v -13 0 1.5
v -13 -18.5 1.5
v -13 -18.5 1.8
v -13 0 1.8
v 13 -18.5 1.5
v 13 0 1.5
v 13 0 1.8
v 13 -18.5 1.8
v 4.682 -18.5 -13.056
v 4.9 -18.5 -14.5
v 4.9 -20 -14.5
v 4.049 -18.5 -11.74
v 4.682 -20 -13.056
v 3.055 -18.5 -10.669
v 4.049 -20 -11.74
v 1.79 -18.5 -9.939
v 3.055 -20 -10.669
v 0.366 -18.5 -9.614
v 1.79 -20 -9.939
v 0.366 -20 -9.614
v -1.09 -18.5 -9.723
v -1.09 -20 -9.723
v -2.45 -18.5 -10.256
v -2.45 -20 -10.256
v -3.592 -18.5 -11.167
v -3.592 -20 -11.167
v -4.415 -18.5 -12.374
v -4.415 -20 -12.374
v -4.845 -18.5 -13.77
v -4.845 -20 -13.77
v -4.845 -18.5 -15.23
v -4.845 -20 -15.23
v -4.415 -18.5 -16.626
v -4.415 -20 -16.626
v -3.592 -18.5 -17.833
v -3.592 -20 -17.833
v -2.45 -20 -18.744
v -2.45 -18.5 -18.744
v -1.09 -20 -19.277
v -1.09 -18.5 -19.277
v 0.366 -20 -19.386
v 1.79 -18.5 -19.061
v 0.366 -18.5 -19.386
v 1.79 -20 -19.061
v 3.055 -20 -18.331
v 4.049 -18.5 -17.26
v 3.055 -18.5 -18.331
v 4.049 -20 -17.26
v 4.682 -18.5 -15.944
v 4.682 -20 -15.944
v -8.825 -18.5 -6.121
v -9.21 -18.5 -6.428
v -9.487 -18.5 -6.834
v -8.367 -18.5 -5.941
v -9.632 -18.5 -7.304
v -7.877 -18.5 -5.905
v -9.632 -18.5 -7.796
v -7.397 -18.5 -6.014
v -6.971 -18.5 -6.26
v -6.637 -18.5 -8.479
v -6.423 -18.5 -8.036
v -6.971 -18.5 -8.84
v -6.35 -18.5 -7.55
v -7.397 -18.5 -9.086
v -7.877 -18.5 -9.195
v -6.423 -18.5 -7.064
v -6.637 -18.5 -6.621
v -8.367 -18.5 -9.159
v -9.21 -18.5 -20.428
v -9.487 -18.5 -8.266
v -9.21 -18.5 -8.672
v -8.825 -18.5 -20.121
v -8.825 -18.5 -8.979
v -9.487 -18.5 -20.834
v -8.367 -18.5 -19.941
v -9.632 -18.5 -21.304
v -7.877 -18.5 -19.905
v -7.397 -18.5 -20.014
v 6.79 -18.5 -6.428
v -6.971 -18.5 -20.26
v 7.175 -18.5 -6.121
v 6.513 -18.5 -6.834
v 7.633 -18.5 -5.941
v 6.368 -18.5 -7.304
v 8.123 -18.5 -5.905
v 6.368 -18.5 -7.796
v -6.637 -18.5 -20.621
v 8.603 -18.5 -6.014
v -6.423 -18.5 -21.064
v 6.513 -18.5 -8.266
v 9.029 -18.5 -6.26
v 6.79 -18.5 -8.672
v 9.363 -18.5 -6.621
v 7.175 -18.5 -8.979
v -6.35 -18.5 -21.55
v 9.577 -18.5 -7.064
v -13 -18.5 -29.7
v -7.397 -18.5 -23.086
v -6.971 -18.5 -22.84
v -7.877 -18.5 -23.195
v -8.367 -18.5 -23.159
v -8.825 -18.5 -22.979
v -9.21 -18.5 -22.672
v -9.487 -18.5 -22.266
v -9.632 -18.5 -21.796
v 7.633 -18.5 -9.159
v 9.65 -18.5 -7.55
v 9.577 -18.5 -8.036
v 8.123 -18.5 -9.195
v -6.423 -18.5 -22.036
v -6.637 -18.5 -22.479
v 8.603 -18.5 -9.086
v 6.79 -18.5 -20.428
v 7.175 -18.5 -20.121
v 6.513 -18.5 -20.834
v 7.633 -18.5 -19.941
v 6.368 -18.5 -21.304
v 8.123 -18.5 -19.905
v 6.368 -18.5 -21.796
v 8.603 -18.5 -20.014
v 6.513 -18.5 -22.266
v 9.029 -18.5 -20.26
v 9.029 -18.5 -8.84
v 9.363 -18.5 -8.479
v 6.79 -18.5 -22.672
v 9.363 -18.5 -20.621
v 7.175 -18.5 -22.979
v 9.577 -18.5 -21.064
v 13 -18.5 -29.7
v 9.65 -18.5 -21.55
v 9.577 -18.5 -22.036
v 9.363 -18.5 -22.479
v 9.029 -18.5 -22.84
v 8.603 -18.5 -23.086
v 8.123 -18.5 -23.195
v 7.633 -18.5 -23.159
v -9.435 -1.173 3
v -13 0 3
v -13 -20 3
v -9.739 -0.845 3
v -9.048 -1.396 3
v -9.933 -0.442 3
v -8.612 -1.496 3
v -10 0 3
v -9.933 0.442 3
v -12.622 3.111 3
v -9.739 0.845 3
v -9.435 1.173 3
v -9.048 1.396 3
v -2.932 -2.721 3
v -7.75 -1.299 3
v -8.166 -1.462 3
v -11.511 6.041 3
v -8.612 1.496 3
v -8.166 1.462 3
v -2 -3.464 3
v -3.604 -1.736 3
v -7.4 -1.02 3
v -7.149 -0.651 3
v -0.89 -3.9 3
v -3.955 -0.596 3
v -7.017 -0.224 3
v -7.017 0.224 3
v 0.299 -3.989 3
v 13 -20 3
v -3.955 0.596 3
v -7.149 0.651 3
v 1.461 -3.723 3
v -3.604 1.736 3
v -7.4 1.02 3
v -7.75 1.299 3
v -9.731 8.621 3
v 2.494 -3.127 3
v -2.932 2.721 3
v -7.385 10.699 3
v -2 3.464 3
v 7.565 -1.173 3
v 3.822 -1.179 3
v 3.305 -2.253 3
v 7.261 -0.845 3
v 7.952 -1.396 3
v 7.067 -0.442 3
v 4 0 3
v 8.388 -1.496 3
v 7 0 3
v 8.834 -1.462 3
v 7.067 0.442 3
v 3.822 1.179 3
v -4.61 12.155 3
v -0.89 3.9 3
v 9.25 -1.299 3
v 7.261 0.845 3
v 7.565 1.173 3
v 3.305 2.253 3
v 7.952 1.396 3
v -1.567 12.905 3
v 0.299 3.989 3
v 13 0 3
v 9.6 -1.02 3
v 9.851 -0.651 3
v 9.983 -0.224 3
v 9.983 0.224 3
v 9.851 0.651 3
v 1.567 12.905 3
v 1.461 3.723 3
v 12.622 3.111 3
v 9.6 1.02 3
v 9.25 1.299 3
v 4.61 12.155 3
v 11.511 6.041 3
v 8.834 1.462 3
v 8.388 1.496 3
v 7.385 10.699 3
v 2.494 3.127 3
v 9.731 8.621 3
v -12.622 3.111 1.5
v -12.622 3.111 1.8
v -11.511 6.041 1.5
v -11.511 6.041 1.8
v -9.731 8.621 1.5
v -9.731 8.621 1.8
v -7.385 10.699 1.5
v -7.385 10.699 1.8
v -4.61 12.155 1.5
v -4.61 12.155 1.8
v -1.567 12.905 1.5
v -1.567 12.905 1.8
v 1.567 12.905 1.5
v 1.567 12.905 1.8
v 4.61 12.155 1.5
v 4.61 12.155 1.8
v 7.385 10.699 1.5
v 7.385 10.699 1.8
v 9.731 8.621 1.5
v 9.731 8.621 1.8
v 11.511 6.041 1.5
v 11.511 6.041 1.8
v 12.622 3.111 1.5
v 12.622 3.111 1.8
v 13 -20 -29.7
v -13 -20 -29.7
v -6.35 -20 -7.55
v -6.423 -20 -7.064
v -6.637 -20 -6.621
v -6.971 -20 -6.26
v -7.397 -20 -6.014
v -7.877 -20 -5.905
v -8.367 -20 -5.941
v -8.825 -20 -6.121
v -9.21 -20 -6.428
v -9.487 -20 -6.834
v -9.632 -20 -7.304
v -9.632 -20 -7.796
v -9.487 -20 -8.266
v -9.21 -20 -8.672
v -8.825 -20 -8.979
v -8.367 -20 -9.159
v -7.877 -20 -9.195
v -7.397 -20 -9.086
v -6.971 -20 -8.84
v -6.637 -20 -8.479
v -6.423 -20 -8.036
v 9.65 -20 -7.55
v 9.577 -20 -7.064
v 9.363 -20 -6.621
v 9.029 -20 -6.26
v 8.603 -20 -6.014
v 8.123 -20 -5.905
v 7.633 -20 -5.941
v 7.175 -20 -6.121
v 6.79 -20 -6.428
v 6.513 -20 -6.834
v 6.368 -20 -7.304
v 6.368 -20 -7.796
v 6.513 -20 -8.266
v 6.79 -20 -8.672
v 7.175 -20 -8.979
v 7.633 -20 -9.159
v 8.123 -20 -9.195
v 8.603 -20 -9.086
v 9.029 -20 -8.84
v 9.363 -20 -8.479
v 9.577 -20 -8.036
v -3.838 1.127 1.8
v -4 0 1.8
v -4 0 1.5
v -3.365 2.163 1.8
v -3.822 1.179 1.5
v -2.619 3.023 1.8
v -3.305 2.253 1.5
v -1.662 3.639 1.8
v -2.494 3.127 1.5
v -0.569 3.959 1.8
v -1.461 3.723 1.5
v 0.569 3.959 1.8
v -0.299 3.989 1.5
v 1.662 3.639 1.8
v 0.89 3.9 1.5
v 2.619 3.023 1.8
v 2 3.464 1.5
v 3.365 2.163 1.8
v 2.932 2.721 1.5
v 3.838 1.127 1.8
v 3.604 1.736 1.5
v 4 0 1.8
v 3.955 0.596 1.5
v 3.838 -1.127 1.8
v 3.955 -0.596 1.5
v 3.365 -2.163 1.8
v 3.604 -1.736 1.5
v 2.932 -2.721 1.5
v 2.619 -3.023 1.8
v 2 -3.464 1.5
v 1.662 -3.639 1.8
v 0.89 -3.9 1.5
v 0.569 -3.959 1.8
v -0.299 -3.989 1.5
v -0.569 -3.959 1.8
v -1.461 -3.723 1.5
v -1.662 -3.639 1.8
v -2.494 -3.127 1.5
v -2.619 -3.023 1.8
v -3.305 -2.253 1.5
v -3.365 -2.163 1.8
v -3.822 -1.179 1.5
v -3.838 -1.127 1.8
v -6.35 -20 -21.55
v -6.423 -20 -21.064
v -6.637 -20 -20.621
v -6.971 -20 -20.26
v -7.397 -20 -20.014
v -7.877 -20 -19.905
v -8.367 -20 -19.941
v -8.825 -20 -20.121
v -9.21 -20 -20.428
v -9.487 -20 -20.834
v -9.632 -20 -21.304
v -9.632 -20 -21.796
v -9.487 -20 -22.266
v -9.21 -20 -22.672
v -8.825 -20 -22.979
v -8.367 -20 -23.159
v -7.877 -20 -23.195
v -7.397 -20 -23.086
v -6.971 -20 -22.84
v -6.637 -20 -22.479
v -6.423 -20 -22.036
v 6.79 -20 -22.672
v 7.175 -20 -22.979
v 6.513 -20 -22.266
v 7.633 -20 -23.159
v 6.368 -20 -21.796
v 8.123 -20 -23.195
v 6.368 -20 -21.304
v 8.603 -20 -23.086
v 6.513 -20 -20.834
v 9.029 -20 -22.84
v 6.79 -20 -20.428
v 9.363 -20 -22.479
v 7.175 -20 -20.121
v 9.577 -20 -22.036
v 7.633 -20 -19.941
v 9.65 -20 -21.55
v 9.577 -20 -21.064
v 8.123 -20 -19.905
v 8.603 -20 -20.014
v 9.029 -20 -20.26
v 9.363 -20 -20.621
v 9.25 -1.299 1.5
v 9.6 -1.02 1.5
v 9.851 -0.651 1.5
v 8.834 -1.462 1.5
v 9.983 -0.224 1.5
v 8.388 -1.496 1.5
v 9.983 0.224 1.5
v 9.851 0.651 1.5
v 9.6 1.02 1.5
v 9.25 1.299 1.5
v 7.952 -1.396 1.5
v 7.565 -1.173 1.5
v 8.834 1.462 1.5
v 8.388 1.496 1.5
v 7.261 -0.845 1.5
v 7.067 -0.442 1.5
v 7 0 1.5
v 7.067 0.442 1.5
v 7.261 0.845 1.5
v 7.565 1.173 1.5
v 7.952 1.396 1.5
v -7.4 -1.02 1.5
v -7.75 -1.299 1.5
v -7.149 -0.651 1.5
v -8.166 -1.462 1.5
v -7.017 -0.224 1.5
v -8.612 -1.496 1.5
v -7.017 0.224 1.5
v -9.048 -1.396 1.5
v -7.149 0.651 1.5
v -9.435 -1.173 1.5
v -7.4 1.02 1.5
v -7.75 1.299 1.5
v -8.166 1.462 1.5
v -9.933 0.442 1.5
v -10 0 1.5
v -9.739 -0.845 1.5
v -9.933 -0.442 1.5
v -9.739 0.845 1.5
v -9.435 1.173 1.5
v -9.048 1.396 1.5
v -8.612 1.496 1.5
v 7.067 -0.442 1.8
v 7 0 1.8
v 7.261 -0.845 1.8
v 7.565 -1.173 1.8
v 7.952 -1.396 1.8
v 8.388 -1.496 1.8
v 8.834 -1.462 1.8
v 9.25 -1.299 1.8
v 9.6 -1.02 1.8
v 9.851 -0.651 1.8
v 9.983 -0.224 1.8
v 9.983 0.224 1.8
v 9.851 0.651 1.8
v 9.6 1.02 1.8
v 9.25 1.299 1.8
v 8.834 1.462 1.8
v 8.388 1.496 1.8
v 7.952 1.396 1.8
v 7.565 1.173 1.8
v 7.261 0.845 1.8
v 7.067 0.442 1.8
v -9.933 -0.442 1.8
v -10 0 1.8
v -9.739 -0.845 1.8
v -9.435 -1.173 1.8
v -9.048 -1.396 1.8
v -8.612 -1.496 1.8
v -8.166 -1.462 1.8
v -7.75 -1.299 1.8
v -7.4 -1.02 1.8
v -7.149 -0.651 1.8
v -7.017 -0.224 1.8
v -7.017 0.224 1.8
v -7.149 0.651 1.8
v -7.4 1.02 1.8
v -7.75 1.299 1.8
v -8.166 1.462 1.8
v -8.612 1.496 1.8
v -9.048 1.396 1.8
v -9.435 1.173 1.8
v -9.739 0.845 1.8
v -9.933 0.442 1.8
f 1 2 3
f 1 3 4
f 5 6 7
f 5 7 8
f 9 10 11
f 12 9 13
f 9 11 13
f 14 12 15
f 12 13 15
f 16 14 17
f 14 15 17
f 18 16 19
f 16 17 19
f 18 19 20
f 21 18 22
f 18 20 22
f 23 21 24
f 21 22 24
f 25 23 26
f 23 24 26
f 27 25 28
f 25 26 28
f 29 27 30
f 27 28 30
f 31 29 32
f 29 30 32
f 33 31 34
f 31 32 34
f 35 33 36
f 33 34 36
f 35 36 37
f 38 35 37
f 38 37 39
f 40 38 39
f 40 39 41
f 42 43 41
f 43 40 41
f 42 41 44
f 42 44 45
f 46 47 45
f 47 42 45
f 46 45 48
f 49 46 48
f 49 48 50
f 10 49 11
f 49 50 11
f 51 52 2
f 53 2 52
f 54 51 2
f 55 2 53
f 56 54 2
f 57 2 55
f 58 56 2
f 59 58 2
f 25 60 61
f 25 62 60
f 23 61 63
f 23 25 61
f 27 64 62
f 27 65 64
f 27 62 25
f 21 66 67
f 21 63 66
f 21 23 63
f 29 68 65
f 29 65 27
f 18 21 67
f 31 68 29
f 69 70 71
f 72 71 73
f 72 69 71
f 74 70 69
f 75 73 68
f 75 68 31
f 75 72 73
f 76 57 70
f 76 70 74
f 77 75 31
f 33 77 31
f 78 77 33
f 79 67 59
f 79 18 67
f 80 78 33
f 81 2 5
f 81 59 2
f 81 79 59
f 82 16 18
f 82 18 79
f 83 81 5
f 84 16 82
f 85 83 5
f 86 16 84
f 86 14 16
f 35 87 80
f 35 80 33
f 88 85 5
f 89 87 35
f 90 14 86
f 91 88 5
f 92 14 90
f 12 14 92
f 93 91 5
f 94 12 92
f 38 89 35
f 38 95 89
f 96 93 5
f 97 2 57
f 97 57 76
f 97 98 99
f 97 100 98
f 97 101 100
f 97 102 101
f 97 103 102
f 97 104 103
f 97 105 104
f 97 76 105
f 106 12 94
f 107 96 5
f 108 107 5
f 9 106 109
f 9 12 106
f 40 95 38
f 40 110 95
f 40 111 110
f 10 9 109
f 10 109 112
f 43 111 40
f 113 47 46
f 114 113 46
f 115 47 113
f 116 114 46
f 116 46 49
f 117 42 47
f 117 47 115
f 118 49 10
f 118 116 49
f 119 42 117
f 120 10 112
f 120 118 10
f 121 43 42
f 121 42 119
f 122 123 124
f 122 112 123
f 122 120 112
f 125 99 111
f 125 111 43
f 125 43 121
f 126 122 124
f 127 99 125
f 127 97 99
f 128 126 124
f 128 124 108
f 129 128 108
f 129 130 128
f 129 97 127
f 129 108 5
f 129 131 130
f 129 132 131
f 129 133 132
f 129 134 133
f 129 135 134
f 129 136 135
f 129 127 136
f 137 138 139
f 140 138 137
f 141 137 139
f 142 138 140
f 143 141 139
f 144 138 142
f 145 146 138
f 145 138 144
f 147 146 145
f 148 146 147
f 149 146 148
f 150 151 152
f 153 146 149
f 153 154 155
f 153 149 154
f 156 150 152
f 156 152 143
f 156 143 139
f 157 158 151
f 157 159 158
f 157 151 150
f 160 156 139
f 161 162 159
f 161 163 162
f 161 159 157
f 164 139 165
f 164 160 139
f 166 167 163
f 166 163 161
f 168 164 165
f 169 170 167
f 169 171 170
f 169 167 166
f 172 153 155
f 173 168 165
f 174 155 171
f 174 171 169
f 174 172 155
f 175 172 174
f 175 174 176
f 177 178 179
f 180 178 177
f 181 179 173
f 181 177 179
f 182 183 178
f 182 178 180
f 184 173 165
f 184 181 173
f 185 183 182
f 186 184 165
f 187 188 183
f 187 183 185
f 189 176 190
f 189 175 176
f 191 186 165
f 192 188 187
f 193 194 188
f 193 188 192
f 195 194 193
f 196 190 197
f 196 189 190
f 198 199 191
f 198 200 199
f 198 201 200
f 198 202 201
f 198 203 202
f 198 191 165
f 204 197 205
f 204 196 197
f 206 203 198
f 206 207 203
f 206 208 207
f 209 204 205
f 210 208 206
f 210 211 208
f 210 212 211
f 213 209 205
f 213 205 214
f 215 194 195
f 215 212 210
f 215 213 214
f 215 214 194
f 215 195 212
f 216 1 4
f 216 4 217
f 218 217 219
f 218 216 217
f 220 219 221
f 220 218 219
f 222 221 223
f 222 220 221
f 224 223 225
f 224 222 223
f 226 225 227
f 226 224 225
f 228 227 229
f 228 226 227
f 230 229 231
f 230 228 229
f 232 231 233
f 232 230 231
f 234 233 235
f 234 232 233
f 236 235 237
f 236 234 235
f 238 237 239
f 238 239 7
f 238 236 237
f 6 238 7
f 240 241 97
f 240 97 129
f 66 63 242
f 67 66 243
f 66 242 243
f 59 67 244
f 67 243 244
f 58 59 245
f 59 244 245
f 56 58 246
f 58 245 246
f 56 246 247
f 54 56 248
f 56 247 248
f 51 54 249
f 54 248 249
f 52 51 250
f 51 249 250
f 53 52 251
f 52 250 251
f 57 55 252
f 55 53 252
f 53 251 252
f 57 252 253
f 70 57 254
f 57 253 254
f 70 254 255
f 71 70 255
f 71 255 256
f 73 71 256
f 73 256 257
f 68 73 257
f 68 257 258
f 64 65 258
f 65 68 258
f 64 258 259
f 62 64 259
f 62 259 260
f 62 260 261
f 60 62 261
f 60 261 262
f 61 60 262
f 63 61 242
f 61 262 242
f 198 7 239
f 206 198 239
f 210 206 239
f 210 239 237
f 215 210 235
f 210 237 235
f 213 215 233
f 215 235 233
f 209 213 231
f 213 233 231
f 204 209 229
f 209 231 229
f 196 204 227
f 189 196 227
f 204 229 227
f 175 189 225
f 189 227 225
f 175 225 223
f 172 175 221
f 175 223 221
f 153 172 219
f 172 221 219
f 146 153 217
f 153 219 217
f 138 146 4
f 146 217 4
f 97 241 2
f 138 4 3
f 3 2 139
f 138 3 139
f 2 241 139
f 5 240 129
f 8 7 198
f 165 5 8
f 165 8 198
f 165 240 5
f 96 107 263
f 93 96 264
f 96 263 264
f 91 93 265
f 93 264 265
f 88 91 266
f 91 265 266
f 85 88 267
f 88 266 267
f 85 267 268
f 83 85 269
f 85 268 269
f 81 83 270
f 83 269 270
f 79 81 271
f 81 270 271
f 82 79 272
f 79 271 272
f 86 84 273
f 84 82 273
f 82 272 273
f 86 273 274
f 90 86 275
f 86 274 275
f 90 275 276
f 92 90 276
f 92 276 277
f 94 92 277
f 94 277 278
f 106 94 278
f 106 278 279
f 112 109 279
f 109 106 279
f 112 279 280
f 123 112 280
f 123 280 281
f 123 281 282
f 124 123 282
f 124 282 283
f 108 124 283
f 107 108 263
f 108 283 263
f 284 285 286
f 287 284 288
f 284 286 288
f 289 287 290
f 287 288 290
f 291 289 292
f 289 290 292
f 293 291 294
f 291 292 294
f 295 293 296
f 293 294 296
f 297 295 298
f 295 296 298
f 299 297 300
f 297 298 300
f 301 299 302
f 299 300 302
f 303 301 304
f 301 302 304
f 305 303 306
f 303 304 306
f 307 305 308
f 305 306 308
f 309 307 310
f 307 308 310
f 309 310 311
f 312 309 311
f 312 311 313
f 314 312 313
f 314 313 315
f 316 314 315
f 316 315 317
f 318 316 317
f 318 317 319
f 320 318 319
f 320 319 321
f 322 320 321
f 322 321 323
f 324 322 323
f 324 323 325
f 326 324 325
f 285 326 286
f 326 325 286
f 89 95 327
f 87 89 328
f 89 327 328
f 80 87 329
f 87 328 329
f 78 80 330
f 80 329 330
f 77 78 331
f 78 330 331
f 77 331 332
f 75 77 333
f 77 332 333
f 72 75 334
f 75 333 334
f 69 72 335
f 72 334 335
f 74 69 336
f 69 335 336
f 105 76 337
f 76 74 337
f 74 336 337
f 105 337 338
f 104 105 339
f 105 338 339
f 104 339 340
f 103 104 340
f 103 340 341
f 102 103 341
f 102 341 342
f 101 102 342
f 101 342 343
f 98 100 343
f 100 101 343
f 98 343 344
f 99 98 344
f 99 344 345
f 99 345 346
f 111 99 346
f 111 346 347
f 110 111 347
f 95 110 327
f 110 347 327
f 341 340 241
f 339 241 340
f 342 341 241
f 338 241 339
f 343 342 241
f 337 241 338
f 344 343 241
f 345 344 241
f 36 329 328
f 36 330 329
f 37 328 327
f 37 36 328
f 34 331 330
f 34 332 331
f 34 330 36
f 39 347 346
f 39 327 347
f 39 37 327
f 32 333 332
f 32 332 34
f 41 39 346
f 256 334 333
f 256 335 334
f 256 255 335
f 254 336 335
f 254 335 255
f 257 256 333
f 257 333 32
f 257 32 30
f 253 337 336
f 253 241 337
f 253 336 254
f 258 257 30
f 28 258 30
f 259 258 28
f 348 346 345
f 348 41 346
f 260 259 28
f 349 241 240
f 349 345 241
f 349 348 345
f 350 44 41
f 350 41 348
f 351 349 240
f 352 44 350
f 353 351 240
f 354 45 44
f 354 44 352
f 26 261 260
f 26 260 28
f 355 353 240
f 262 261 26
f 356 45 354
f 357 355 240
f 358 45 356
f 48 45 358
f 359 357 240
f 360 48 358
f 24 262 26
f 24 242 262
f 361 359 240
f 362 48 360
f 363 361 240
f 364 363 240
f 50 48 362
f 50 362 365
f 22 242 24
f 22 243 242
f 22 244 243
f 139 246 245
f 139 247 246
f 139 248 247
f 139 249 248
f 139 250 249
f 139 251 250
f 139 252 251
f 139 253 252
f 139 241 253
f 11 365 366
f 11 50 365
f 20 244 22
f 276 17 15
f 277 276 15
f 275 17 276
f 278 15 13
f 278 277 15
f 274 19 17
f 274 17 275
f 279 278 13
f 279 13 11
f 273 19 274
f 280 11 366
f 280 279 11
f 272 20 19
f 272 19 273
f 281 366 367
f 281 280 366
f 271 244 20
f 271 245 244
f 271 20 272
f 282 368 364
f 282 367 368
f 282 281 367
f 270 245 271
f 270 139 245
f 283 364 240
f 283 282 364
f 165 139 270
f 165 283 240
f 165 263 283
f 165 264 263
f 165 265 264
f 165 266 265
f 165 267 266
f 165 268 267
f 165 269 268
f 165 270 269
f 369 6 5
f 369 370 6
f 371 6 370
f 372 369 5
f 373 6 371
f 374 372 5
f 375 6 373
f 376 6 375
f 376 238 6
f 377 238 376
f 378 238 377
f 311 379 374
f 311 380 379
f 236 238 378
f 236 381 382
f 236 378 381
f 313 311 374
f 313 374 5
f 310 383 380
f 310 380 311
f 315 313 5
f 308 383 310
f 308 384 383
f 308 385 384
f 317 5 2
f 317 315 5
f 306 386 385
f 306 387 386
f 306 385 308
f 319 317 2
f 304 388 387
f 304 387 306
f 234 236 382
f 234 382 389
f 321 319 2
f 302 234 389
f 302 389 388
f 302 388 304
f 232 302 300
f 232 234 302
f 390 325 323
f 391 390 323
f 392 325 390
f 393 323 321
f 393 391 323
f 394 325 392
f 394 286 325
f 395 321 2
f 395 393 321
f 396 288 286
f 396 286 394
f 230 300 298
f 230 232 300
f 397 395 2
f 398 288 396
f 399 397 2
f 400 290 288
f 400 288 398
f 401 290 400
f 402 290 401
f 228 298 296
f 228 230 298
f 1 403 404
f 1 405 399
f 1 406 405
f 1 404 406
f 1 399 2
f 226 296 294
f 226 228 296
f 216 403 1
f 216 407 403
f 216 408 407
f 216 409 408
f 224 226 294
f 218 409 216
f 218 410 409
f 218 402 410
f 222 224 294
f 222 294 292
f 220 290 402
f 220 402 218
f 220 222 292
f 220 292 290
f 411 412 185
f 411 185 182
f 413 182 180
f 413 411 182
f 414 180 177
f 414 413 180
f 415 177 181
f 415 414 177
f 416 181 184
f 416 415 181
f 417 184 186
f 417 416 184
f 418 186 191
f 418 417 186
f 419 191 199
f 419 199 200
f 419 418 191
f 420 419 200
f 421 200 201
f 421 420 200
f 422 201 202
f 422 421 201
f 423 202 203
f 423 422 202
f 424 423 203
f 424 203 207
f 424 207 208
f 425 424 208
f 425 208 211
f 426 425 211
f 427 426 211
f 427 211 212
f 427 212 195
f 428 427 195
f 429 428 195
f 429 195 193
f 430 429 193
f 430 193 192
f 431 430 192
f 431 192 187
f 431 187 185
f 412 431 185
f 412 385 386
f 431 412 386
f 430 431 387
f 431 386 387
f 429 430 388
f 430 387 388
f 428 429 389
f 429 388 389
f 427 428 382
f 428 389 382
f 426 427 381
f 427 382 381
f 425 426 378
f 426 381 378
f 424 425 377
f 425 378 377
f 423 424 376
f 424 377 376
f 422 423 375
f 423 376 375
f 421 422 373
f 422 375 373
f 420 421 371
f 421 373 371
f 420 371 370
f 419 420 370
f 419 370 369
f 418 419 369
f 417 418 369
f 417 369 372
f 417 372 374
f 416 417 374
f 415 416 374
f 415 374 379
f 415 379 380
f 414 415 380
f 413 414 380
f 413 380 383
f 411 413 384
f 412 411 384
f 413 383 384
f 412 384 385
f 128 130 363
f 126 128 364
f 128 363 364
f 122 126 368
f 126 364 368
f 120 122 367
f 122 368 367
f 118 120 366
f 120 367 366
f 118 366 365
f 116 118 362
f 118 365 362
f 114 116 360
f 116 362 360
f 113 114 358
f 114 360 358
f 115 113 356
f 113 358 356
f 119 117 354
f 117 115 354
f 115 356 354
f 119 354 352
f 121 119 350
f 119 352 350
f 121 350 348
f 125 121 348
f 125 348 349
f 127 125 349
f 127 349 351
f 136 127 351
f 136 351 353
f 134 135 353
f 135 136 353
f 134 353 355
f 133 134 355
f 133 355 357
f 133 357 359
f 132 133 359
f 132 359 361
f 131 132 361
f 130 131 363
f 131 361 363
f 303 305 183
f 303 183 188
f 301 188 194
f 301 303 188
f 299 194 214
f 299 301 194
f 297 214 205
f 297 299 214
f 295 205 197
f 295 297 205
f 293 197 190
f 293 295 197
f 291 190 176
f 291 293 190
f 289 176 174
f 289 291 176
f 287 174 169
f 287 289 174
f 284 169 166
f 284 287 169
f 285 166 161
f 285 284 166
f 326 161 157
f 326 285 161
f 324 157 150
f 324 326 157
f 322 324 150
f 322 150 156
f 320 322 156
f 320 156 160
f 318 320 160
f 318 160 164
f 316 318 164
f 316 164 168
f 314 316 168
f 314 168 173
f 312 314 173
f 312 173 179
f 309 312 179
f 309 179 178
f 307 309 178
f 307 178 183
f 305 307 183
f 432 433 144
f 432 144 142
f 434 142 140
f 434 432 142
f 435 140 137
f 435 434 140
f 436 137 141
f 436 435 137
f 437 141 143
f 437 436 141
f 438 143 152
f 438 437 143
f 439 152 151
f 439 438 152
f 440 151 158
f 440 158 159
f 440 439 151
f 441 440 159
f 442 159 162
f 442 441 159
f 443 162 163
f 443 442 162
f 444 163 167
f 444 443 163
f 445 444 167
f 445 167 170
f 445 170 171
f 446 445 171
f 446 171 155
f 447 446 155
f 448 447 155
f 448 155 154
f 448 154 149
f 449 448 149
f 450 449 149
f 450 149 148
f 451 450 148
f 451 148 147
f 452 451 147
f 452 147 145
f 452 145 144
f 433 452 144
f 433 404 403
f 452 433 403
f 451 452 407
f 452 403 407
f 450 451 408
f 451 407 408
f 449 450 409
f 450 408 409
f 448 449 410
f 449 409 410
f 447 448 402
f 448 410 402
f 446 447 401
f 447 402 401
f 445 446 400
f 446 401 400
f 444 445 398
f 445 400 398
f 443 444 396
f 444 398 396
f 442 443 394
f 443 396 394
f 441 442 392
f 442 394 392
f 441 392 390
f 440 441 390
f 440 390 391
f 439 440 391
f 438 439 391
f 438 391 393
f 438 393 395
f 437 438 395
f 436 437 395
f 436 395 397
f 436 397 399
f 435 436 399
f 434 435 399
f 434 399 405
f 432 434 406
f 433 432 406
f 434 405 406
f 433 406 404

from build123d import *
from build123d.topology import SkipClean

# Parameters (mm, degrees)
SKETCH_1_R          = 4
SKETCH_1_R_2        = 3
EXTRUDE_1_DEPTH     = 3
SKETCH_2_R          = 3
SKETCH_2_R_2        = 1.5
EXTRUDE_2_DEPTH     = 1.5
SKETCH_3_W          = 26
SKETCH_3_H          = 29.7
SKETCH_3_R          = 4.9
SKETCH_3_R_2        = 1.65
EXTRUDE_3_DEPTH     = 3.3
SKETCH_5_R          = 3
SKETCH_5_R_2        = 1.5
EXTRUDE_4_DEPTH     = 1.5
SKETCH_6_R          = 4
SKETCH_6_R_2        = 1.5
CUT_EXTRUDE_1_DEPTH = 1.8
CUT_EXTRUDE_START   = -1.8
SKETCH_7_W          = 26
SKETCH_7_H          = 31.5
SKETCH_7_R          = 4.9
SKETCH_7_R_2        = 1.65
CUT_EXTRUDE_2_DEPTH = 1.8
EXTRUDE_START       = 0.3
SKETCH_11_R         = 4
SKETCH_11_R_2       = 1.5
EXTRUDE_5_DEPTH     = 0.3


with BuildPart() as part:
    # 草图1 → 凸台-拉伸1 (new body)
    with BuildSketch(Plane.XY):
        with BuildLine():
            Line((-13, 0), (-13, -20))
            Line((-13, -20), (13, -20))
            Line((13, -20), (13, 0))
            ThreePointArc((13, 0), (0, 13), (-13, 0))
        make_face()
        Circle(SKETCH_1_R, mode=Mode.SUBTRACT)
        with Locations((8.5, 0)):
            Circle(SKETCH_1_R_2, mode=Mode.SUBTRACT)
        with Locations((-8.5, 0)):
            Circle(SKETCH_1_R_2, mode=Mode.SUBTRACT)
    extrude(amount=EXTRUDE_1_DEPTH)

    # 草图2 → 凸台-拉伸2 (add)
    # profile 1 of 2: a face of its own
    with BuildSketch(Plane(origin=(0, 0, 0), x_dir=(-1, 0, 0), z_dir=(0, 0, -1))):
        with Locations((8.5, 0)):
            Circle(SKETCH_2_R)
        with Locations((8.5, 0)):
            Circle(SKETCH_2_R_2, mode=Mode.SUBTRACT)
    # profile 2 of 2: a face of its own
    with BuildSketch(Plane(origin=(0, 0, 0), x_dir=(-1, 0, 0), z_dir=(0, 0, -1))):
        with Locations((-8.5, 0)):
            Circle(SKETCH_2_R)
        with Locations((-8.5, 0)):
            Circle(SKETCH_2_R_2, mode=Mode.SUBTRACT)
    extrude(amount=-EXTRUDE_2_DEPTH)

    # 草图3 → 凸台-拉伸3 (add)
    with BuildSketch(Plane.XZ.offset(20)):
        with Locations((0, -14.85)):
            Rectangle(SKETCH_3_W, SKETCH_3_H)
        with Locations((0, -14.5)):
            Circle(SKETCH_3_R, mode=Mode.SUBTRACT)
        with Locations((-8, -21.55)):
            Circle(SKETCH_3_R_2, mode=Mode.SUBTRACT)
        with Locations((-8, -7.55)):
            Circle(SKETCH_3_R_2, mode=Mode.SUBTRACT)
        with Locations((8, -7.55)):
            Circle(SKETCH_3_R_2, mode=Mode.SUBTRACT)
        with Locations((8, -21.55)):
            Circle(SKETCH_3_R_2, mode=Mode.SUBTRACT)
    extrude(amount=-EXTRUDE_3_DEPTH)

    # 草图5 → 凸台-拉伸4 (add)
    # profile 1 of 2: a face of its own
    with BuildSketch(Plane.XY.offset(1.5)):
        with Locations((-8.5, 0)):
            Circle(SKETCH_5_R)
        with Locations(Location((-8.5, 0, 0), (0, 0, 180))):
            Circle(SKETCH_5_R_2, mode=Mode.SUBTRACT)
    # profile 2 of 2: a face of its own
    with BuildSketch(Plane.XY.offset(1.5)):
        with Locations((8.5, 0)):
            Circle(SKETCH_5_R)
        with Locations(Location((8.5, 0, 0), (0, 0, 180))):
            Circle(SKETCH_5_R_2, mode=Mode.SUBTRACT)
    extrude(amount=EXTRUDE_4_DEPTH)

    # 草图6 → 切除-拉伸1 (cut)
    with BuildSketch(Plane(origin=(0, 0, 0), x_dir=(-1, 0, 0), z_dir=(0, 0, -1))):
        with BuildLine():
            Line((-13, -16.7), (13, -16.7))
            Line((13, -16.7), (13, 0))
            ThreePointArc((13, 0), (0, 13), (-13, 0))
            Line((-13, 0), (-13, -16.7))
        make_face()
        Circle(SKETCH_6_R, mode=Mode.SUBTRACT)
        with Locations((8.5, 0)):
            Circle(SKETCH_6_R_2, mode=Mode.SUBTRACT)
        with Locations((-8.5, 0)):
            Circle(SKETCH_6_R_2, mode=Mode.SUBTRACT)
    extrude(amount=-CUT_EXTRUDE_1_DEPTH, mode=Mode.SUBTRACT)

    # 草图7 → 切除-拉伸2 (cut)
    with BuildSketch(Plane(origin=(0, -16.7, 0), x_dir=(1, 0, 0), z_dir=(0, 1, 0)).offset(CUT_EXTRUDE_START)):
        with Locations((0, 13.95)):
            Rectangle(SKETCH_7_W, SKETCH_7_H)
        with Locations((0, 14.5)):
            Circle(SKETCH_7_R, mode=Mode.SUBTRACT)
        with Locations((-8, 7.55)):
            Circle(SKETCH_7_R_2, mode=Mode.SUBTRACT)
        with Locations((8, 7.55)):
            Circle(SKETCH_7_R_2, mode=Mode.SUBTRACT)
        with Locations((8, 21.55)):
            Circle(SKETCH_7_R_2, mode=Mode.SUBTRACT)
        with Locations((-8, 21.55)):
            Circle(SKETCH_7_R_2, mode=Mode.SUBTRACT)
    extrude(amount=CUT_EXTRUDE_2_DEPTH, mode=Mode.SUBTRACT)

    # 草图11 → 凸台-拉伸5 (add)
    with SkipClean():  # the faces are left unmerged after this step: merging them gives an invalid solid
        with BuildSketch(Plane(origin=(0, 0, 1.8), x_dir=(-1, 0, 0), z_dir=(0, 0, -1)).offset(EXTRUDE_START)):
            with BuildLine():
                Line((-13, 0), (-13, -18.5))
                Line((-13, -18.5), (13, -18.5))
                Line((13, -18.5), (13, 0))
                ThreePointArc((13, 0), (0, 13), (-13, 0))
            make_face()
            Circle(SKETCH_11_R, mode=Mode.SUBTRACT)
            with Locations((-8.5, 0)):
                Circle(SKETCH_11_R_2, mode=Mode.SUBTRACT)
            with Locations((8.5, 0)):
                Circle(SKETCH_11_R_2, mode=Mode.SUBTRACT)
        extrude(amount=-EXTRUDE_5_DEPTH)


solid = part.part
